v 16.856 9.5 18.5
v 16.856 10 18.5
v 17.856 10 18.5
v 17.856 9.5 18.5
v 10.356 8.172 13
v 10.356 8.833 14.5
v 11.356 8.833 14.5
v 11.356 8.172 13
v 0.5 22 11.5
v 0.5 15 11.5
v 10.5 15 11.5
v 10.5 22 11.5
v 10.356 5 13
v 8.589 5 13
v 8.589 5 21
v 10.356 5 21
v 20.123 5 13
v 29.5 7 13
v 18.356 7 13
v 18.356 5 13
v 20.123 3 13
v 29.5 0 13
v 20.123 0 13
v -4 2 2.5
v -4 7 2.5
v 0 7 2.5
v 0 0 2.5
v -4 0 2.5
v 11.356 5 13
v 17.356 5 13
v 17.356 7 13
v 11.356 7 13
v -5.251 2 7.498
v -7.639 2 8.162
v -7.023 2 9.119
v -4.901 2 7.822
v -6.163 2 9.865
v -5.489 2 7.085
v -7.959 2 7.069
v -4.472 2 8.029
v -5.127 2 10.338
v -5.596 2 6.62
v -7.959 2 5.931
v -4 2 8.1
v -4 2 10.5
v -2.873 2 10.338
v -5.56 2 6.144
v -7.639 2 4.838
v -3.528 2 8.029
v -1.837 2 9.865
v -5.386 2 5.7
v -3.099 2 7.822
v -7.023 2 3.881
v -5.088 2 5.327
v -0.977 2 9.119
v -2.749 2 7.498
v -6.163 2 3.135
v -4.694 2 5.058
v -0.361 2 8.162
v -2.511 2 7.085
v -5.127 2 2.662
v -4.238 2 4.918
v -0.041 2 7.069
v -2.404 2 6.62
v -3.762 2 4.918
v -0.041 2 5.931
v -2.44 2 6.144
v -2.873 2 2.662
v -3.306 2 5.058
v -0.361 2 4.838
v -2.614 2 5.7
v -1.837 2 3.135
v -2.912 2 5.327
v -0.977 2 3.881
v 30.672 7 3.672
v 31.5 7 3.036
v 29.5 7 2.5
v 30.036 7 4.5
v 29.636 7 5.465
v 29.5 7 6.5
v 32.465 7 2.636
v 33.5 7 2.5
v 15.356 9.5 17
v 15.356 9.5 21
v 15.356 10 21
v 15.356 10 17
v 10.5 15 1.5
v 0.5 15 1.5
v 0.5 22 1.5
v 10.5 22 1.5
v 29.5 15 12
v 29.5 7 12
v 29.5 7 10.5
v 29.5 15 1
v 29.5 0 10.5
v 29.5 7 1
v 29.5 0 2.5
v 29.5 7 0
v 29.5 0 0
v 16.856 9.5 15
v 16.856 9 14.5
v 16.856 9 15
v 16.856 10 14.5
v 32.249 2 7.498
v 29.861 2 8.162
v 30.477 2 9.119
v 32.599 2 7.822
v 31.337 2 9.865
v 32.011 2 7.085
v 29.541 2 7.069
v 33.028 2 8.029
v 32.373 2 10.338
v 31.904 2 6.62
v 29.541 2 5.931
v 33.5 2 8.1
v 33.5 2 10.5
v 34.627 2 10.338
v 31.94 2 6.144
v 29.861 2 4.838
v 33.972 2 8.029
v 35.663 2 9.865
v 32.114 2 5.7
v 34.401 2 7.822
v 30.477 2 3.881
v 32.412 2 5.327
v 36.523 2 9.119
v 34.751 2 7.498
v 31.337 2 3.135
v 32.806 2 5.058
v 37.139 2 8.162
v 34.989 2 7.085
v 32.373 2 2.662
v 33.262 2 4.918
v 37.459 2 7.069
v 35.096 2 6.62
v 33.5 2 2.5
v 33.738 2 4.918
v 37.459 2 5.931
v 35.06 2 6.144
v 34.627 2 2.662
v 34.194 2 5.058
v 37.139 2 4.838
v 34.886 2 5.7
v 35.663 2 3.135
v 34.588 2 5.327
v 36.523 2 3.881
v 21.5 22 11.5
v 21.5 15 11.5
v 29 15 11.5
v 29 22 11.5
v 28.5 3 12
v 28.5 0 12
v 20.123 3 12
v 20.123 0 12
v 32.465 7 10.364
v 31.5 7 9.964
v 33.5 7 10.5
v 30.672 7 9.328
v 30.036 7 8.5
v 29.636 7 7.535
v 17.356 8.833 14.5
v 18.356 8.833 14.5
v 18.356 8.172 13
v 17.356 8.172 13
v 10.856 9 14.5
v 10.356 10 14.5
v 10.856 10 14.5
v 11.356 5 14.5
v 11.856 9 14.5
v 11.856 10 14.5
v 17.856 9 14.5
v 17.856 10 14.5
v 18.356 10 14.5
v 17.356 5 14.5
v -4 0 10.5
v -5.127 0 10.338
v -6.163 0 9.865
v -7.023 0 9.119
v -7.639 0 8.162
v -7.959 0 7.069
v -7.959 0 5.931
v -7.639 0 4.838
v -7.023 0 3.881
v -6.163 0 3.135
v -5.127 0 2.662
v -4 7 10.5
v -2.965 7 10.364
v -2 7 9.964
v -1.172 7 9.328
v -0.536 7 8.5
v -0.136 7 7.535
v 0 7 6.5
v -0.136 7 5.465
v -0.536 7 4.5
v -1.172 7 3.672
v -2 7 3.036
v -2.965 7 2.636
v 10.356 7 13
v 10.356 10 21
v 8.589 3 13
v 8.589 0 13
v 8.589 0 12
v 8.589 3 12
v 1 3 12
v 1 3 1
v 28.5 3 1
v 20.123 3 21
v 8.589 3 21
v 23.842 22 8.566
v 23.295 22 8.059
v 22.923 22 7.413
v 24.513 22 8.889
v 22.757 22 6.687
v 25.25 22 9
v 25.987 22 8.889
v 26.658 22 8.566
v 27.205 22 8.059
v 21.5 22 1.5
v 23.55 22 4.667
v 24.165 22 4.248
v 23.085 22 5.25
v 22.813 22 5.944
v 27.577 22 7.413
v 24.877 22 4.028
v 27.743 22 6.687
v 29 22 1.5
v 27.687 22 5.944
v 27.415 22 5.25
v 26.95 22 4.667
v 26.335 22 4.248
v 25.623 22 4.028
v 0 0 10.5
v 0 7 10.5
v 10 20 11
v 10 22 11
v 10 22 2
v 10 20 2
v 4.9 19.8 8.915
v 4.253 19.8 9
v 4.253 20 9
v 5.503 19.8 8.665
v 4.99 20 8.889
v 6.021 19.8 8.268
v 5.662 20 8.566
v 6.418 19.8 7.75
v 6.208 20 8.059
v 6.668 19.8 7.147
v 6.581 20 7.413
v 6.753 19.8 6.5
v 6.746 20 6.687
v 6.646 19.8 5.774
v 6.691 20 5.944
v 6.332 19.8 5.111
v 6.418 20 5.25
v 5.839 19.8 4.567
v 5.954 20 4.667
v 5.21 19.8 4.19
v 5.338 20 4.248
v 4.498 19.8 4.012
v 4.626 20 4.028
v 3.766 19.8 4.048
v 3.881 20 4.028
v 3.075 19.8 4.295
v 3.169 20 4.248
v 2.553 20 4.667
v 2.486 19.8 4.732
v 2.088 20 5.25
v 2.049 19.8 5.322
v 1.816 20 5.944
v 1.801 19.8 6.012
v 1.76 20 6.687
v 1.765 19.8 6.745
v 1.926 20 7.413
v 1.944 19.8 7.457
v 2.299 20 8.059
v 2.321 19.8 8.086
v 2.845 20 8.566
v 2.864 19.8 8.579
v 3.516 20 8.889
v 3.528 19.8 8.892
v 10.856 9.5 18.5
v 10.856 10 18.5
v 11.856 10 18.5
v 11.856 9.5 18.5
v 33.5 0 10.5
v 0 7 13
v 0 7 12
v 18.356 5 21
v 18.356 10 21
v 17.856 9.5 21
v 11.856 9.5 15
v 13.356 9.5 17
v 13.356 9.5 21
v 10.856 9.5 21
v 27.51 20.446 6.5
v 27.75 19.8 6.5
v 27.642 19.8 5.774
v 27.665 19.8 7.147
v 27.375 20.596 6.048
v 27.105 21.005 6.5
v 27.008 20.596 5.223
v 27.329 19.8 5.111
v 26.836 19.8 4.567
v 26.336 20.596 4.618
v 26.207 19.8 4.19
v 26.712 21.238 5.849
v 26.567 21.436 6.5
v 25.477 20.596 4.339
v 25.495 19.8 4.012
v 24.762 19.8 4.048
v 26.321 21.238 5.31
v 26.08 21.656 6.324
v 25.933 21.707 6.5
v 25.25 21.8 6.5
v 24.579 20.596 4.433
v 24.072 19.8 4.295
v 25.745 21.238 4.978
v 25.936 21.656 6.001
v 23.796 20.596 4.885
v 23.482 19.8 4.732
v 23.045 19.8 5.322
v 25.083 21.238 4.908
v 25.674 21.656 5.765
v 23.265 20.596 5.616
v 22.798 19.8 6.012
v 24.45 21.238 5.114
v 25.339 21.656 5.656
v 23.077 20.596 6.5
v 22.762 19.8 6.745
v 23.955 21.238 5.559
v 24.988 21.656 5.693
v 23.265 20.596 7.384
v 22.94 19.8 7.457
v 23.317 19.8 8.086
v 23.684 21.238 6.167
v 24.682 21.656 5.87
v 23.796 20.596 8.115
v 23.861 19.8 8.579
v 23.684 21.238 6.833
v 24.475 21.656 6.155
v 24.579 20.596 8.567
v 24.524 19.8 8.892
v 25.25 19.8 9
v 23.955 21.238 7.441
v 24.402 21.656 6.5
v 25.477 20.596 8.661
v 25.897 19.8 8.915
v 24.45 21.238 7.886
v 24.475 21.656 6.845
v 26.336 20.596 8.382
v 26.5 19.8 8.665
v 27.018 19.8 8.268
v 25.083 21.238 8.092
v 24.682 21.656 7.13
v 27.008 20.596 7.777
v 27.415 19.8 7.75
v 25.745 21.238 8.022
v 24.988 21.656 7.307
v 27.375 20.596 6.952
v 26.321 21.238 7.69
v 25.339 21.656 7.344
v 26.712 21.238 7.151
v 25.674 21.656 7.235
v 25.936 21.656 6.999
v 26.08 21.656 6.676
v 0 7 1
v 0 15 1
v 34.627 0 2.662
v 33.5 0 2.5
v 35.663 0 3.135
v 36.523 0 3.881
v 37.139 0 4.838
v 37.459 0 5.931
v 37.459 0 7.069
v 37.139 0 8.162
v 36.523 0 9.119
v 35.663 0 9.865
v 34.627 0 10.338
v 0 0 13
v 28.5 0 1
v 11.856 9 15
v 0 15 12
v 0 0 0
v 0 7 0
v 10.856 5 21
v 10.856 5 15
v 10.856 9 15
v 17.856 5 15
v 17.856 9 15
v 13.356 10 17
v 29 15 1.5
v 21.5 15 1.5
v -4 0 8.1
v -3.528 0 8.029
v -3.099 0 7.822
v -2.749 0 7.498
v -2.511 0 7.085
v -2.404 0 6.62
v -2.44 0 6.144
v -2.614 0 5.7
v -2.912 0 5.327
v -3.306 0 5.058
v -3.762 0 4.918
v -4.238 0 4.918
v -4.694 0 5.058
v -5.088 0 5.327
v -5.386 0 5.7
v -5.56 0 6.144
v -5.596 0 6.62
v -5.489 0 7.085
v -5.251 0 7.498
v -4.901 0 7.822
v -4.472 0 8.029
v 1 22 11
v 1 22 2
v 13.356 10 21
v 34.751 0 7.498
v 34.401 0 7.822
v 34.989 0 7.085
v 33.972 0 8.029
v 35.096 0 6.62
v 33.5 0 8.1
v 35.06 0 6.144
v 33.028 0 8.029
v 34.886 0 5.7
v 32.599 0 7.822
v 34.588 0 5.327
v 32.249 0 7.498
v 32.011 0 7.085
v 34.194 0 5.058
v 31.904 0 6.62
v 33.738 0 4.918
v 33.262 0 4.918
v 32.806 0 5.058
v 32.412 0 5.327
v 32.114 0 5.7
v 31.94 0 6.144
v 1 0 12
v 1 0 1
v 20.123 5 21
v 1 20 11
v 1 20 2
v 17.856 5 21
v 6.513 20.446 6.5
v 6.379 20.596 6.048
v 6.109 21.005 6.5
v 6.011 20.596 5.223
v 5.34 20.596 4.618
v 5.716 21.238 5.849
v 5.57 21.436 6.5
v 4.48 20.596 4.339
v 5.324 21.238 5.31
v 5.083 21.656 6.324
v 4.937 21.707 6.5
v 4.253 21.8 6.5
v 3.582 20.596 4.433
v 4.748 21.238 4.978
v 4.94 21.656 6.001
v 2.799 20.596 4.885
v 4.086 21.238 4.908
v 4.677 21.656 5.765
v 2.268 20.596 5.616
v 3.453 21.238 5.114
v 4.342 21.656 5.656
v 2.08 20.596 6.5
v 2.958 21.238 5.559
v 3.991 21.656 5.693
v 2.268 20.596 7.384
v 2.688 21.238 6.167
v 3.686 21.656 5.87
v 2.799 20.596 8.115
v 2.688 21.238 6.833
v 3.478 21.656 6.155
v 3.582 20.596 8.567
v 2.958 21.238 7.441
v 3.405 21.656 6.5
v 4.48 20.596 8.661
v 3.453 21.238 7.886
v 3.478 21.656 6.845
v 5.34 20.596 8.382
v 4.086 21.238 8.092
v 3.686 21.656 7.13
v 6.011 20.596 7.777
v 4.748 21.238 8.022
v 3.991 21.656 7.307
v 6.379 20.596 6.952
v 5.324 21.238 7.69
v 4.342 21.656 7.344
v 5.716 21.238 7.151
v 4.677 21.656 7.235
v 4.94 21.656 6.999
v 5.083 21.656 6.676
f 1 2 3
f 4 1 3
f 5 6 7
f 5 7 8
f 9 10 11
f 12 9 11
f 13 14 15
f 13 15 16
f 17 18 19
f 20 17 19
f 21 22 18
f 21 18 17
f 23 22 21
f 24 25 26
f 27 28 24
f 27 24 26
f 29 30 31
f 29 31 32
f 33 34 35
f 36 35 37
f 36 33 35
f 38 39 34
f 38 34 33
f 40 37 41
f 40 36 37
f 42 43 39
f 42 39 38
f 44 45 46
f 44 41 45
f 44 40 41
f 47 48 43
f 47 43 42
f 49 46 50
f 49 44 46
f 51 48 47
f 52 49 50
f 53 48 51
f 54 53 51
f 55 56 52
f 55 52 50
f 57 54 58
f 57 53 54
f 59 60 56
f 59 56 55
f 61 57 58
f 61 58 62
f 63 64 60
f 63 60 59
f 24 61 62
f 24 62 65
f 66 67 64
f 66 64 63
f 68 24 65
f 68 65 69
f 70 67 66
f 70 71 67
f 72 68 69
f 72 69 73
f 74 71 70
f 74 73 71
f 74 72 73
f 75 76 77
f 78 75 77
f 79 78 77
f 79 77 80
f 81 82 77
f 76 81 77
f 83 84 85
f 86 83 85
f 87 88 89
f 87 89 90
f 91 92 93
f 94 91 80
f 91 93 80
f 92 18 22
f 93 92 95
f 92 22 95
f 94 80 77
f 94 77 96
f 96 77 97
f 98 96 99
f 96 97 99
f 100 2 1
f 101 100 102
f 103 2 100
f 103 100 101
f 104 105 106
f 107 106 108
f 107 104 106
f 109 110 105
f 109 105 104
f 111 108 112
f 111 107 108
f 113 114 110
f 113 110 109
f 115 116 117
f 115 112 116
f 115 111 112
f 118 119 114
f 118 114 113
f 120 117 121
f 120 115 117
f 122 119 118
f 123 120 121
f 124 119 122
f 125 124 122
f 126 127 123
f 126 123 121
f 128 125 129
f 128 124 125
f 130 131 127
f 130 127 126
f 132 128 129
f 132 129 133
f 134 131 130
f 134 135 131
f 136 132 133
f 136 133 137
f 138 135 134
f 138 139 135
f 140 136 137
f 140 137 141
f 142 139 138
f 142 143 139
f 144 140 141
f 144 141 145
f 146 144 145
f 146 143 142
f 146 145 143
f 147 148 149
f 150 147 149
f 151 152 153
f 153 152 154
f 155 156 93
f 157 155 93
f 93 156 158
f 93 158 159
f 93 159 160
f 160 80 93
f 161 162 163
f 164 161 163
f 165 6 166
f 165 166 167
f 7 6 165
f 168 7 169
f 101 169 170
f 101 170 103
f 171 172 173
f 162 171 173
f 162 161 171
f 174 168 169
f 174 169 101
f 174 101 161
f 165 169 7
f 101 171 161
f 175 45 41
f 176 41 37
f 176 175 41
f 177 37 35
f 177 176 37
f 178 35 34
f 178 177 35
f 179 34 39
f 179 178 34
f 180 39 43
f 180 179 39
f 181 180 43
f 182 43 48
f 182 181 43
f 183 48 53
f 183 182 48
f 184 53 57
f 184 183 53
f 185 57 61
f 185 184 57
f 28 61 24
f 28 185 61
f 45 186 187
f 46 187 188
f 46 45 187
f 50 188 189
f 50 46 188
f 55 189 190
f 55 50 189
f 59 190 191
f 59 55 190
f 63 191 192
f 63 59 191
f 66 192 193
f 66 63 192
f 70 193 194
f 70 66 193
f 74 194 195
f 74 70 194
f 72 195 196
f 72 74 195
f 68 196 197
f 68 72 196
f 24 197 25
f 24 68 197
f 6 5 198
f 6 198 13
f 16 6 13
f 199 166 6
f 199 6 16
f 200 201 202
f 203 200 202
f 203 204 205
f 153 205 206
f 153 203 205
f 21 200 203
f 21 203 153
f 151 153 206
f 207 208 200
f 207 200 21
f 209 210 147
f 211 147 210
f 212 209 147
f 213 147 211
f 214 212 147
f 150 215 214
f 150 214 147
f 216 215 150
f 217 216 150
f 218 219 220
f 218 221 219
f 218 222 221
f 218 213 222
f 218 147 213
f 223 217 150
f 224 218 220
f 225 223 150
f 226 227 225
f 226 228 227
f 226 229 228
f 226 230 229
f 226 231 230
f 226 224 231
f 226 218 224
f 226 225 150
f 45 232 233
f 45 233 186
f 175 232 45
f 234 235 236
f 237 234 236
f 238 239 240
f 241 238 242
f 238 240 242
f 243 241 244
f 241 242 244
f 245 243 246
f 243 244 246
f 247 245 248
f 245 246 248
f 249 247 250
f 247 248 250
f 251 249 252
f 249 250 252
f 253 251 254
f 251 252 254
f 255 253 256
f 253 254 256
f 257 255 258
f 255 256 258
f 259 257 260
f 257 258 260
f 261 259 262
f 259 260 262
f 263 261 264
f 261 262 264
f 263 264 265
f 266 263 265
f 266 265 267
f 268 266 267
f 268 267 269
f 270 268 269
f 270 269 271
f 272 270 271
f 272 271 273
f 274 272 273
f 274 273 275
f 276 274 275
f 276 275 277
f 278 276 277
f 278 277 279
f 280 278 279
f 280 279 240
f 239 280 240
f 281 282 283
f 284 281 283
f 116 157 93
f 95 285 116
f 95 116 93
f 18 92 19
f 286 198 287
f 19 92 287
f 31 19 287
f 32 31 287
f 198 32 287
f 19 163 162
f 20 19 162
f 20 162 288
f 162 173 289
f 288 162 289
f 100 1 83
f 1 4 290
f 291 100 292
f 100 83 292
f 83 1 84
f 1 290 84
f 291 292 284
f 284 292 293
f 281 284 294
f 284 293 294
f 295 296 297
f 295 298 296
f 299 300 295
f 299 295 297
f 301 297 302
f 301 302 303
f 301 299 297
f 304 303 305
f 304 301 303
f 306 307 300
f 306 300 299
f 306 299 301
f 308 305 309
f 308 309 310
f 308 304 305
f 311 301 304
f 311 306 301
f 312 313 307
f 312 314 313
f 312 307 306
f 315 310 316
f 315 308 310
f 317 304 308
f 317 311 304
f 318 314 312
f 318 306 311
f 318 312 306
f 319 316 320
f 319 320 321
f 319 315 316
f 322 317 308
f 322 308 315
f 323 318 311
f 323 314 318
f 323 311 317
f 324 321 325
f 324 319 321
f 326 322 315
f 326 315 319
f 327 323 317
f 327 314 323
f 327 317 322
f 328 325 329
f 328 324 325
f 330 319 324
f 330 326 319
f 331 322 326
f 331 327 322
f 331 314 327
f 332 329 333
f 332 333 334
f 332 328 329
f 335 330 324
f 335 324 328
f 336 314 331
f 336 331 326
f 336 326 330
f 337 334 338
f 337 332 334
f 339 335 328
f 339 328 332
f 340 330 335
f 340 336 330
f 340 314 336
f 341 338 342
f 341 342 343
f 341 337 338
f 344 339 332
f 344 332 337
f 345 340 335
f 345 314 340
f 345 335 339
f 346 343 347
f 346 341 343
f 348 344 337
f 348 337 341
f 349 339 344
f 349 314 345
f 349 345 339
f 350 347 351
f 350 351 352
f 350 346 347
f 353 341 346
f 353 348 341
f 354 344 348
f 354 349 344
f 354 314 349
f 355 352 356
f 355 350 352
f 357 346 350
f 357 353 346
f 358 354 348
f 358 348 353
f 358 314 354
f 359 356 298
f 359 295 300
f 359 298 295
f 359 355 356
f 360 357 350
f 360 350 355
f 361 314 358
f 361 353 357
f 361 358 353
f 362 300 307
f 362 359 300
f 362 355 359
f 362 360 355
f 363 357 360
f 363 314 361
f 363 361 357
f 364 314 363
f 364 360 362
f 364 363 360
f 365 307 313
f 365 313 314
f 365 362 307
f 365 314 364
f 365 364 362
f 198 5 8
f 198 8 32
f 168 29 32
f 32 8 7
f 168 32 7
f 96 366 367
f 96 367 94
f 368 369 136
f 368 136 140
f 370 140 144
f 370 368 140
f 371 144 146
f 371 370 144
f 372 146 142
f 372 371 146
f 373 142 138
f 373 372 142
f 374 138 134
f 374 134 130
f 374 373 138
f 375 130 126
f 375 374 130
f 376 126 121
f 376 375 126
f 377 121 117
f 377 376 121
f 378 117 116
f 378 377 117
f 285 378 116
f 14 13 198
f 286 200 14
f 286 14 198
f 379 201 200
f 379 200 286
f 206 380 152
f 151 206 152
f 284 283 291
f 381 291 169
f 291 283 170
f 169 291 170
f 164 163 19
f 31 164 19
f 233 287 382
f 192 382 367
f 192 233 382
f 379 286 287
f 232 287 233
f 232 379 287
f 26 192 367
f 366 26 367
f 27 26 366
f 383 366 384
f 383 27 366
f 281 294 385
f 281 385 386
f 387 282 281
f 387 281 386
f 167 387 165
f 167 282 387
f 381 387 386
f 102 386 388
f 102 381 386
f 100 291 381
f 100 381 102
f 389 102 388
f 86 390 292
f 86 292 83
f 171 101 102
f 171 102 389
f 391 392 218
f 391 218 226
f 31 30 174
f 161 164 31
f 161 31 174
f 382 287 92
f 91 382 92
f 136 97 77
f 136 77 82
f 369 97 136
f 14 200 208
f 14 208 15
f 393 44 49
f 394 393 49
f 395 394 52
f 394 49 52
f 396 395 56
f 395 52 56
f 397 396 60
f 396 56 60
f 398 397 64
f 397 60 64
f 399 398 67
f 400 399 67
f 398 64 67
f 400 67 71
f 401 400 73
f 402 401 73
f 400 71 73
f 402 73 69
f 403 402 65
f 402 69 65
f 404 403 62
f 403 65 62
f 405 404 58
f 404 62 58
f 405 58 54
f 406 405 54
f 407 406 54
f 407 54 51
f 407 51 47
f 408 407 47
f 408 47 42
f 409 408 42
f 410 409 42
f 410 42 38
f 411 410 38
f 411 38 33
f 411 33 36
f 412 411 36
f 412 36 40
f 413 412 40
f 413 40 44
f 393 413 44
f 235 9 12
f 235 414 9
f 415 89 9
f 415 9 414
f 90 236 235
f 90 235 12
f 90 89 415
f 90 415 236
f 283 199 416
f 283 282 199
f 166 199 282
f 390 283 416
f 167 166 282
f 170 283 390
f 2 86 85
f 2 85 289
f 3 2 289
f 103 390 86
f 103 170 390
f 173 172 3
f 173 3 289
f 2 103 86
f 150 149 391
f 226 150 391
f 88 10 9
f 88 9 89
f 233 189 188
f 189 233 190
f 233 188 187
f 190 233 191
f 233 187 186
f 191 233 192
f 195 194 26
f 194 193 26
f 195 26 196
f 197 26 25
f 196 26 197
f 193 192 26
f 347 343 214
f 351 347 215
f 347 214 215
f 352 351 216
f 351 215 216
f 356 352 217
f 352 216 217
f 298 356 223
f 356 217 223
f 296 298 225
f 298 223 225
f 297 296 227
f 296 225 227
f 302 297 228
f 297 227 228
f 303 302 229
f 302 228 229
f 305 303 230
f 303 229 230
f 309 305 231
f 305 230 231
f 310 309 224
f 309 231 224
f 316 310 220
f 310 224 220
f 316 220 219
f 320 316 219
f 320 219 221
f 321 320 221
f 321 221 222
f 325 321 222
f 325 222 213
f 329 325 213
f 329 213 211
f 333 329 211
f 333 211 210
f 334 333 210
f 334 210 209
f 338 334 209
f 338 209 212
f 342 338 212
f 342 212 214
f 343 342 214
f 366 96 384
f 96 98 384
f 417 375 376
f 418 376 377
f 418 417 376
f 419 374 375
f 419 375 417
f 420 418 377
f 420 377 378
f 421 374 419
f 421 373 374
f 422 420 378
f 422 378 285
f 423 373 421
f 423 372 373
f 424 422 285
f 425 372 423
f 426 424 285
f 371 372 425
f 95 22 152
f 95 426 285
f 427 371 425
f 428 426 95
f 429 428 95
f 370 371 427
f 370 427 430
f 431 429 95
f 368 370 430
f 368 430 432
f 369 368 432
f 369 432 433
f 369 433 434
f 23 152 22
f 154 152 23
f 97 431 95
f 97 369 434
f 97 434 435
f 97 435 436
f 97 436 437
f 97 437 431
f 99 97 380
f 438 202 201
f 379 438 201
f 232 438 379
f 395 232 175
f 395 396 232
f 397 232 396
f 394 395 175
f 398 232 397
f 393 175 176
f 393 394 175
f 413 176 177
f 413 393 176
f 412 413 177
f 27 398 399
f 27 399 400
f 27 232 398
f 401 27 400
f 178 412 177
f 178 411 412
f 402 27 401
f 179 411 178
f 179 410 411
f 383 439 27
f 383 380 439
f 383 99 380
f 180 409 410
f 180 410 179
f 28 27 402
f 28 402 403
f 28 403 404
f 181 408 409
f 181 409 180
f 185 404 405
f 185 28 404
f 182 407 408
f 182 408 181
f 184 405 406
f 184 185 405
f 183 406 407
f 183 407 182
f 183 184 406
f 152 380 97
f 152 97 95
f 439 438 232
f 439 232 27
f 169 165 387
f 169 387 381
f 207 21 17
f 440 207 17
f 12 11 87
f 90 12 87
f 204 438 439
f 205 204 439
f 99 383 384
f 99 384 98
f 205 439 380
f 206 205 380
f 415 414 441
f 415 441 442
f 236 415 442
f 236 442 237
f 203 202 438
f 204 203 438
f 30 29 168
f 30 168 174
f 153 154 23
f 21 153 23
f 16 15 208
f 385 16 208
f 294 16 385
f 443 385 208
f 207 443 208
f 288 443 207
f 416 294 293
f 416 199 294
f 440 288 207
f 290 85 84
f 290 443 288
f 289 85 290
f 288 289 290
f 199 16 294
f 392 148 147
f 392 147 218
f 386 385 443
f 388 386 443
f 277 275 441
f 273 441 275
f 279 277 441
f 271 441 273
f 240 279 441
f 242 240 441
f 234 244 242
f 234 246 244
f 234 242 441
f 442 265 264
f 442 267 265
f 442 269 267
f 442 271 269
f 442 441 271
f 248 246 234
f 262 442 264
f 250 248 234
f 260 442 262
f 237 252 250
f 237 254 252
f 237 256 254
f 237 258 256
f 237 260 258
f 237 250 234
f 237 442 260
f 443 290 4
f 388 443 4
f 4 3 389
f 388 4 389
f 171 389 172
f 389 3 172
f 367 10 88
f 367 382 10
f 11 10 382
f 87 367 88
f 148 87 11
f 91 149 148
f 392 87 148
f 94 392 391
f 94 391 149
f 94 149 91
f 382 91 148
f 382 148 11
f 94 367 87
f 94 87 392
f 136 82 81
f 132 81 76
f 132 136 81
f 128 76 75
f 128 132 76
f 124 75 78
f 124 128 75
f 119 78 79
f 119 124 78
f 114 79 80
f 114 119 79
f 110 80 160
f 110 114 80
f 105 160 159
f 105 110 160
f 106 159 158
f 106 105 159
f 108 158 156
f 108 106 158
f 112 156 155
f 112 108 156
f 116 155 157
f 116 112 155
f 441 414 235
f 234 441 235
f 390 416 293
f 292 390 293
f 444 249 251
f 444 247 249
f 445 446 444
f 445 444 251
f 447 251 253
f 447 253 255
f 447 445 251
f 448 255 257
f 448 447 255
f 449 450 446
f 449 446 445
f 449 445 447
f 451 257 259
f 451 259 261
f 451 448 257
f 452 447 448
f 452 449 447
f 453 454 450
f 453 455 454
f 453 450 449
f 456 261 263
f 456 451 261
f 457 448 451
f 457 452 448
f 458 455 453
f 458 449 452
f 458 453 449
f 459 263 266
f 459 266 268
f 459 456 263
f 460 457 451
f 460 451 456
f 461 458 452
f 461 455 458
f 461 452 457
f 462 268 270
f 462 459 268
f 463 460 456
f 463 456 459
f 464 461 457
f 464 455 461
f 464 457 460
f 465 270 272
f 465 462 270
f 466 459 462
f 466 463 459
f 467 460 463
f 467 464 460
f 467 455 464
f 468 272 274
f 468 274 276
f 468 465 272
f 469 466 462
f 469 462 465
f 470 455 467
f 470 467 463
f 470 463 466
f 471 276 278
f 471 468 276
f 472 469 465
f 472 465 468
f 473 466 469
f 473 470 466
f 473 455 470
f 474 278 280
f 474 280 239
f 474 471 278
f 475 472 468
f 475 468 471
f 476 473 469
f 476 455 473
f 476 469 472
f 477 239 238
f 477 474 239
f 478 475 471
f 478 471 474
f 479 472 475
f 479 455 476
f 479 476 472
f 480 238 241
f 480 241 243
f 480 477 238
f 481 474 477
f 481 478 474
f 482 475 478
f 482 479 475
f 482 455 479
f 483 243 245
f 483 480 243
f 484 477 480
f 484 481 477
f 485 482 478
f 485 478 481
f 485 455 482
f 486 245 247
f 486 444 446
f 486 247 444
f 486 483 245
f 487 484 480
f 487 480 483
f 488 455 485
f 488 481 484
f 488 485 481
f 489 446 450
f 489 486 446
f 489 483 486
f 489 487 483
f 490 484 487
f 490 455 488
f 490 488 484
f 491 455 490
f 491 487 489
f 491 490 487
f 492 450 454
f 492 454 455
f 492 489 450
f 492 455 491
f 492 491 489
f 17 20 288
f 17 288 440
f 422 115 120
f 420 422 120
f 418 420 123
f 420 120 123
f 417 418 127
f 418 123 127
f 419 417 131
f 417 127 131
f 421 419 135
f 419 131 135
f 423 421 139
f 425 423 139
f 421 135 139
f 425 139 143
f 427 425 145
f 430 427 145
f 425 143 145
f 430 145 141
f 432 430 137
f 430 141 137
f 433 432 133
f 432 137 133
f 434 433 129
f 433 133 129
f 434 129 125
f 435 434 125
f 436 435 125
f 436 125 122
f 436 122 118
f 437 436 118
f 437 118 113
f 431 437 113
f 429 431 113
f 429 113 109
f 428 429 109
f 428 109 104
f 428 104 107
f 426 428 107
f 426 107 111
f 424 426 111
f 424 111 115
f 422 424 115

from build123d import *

# Parameters (mm, degrees)
EXTRUDE_1_DEPTH     = 7
CUT_EXTRUDE_START   = -5
SKETCH_2_R          = 4
CUT_EXTRUDE_1_DEPTH = 5
SKETCH_3_W          = 29.5
SKETCH_3_H          = 11
EXTRUDE_2_DEPTH     = 8
SKETCH_4_W          = 7.5
SKETCH_4_H          = 10
SKETCH_4_W_2        = 10
EXTRUDE_3_DEPTH     = 7
SKETCH_5_W          = 9
SKETCH_5_H          = 9
CUT_EXTRUDE_2_DEPTH = 2
SKETCH_6_R          = 2.5
CUT_EXTRUDE_3_DEPTH = 2.2
SKETCH_7_R          = 1.6
CUT_EXTRUDE_4_DEPTH = 45.443784717
SKETCH_8_W          = 11.533749137
SKETCH_8_H          = 5
EXTRUDE_4_DEPTH     = 8
CUT_EXTRUDE_5_DEPTH = 3
SKETCH_11_W         = 8
SKETCH_11_H         = 6.5
EXTRUDE_6_DEPTH     = 5
EXTRUDE_7_DEPTH     = 1
EXTRUDE_8_DEPTH     = 1
CUT_EXTRUDE_6_DEPTH = 4
SKETCH_15_W         = 7
SKETCH_15_H         = 4.5
CUT_EXTRUDE_7_DEPTH = 2
SKETCH_16_W         = 1
SKETCH_16_H         = 4
CUT_EXTRUDE_8_DEPTH = 1


# Read off the part's stored shape, not the designer's step: 圆顶1, 圆顶2
with BuildPart() as part:
    # 草图1 → 凸台-拉伸1 (new body)
    with BuildSketch(Plane(origin=(0, 0, 0), x_dir=(1, 0, 0), z_dir=(0, 1, 0))):
        with BuildLine():
            Line((0, 0), (29.5, 0))
            Line((29.5, 0), (29.5, -2.5))
            Line((29.5, -2.5), (33.5, -2.5))
            ThreePointArc((33.5, -2.5), (37.5, -6.5), (33.5, -10.5))
            Line((33.5, -10.5), (29.5, -10.5))
            Line((29.5, -10.5), (29.5, -13))
            Line((29.5, -13), (0, -13))
            Line((0, -13), (0, -10.5))
            Line((0, -10.5), (-4, -10.5))
            ThreePointArc((-4, -10.5), (-8, -6.5), (-4, -2.5))
            Line((-4, -2.5), (0, -2.5))
            Line((0, -2.5), (0, 0))
        make_face()
    extrude(amount=EXTRUDE_1_DEPTH)

    # 草图2 → 切除-拉伸1 (cut)
    with BuildSketch(Plane(origin=(0, 7, 0), x_dir=(1, 0, 0), z_dir=(0, 1, 0)).offset(CUT_EXTRUDE_START)):
        with Locations((-4, -6.5)):
            Circle(SKETCH_2_R)
        with Locations((33.5, -6.5)):
            Circle(SKETCH_2_R)
    extrude(amount=CUT_EXTRUDE_1_DEPTH, mode=Mode.SUBTRACT)

    # 草图3 → 凸台-拉伸2 (add)
    with BuildSketch(Plane(origin=(0, 7, 0), x_dir=(1, 0, 0), z_dir=(0, 1, 0))):
        with Locations((14.75, -6.5)):
            Rectangle(SKETCH_3_W, SKETCH_3_H)
    extrude(amount=EXTRUDE_2_DEPTH)

    # 草图4 → 凸台-拉伸3 (add)
    with BuildSketch(Plane(origin=(0, 15, 0), x_dir=(1, 0, 0), z_dir=(0, 1, 0))):
        with Locations((25.25, -6.5)):
            Rectangle(SKETCH_4_W, SKETCH_4_H)
        with Locations((5.5, -6.5)):
            Rectangle(SKETCH_4_W_2, SKETCH_4_H)
    extrude(amount=EXTRUDE_3_DEPTH)

    # 草图5 → 切除-拉伸2 (cut)
    with BuildSketch(Plane(origin=(0, 22, 0), x_dir=(1, 0, 0), z_dir=(0, 1, 0))):
        with Locations((5.5, -6.5)):
            Rectangle(SKETCH_5_W, SKETCH_5_H)
    extrude(amount=-CUT_EXTRUDE_2_DEPTH, mode=Mode.SUBTRACT)

    # 草图6 → 切除-拉伸3 (cut)
    with BuildSketch(Plane(origin=(0, 22, 0), x_dir=(1, 0, 0), z_dir=(0, 1, 0))):
        with Locations(Location((25.25, -6.5, 0), (0, 0, 270))):
            Circle(SKETCH_6_R)
        with Locations(Location((4.253331237, -6.5, 0), (0, 0, 270))):
            Circle(SKETCH_6_R)
    extrude(amount=-CUT_EXTRUDE_3_DEPTH, mode=Mode.SUBTRACT)

    # 圆顶1 outline → 圆顶1 (revolve)
    with BuildSketch(Plane(origin=(4.253331237, 0, 6.5), x_dir=(1, 0, 0), z_dir=(0, 0, 1))):
        with BuildLine():
            Line((0, 19.8), (2.500000001, 19.799999998))
            ThreePointArc((2.500000001, 19.799999998), (1.60078106, 21.238476323), (0, 21.8))
            Line((0, 21.8), (0, 19.8))
        make_face()
    revolve(axis=Axis((4.253331237, 0, 6.5), (0, 1, 0)))

    # 圆顶2 outline → 圆顶2 (revolve)
    with BuildSketch(Plane(origin=(25.25, 0, 6.5), x_dir=(1, 0, 0), z_dir=(0, 0, 1))):
        with BuildLine():
            Line((0, 19.8), (2.500000001, 19.799999997))
            ThreePointArc((2.500000001, 19.799999997), (1.60078106, 21.238476323), (0, 21.8))
            Line((0, 21.8), (0, 19.8))
        make_face()
    revolve(axis=Axis((25.25, 0, 6.5), (0, 1, 0)))

    # 草图7 → 切除-拉伸4 (cut, through all)
    with BuildSketch(Plane(origin=(0, 2, 0), x_dir=(1, 0, 0), z_dir=(0, 1, 0))):
        with Locations(Location((-4, -6.5, 0), (0, 0, 270))):
            Circle(SKETCH_7_R)
        with Locations(Location((33.5, -6.5, 0), (0, 0, 270))):
            Circle(SKETCH_7_R)
    extrude(amount=-CUT_EXTRUDE_4_DEPTH, mode=Mode.SUBTRACT)

    # 草图8 → 凸台-拉伸4 (add)
    with BuildSketch(Plane.XY.offset(13)):
        with Locations((14.355989937, 2.5)):
            Rectangle(SKETCH_8_W, SKETCH_8_H)
    extrude(amount=EXTRUDE_4_DEPTH)

    # 草图10 → 切除-拉伸5 (cut)
    with BuildSketch(Plane.XZ):
        Polygon((8.589115368, 21), (8.589115368, 12), (1, 12), (1, 1), (28.5, 1), (28.5, 12), (20.122864505, 12), (20.122864505, 21), align=None)
    extrude(amount=-CUT_EXTRUDE_5_DEPTH, mode=Mode.SUBTRACT)

    # 草图11 → 凸台-拉伸6 (add)
    with BuildSketch(Plane(origin=(0, 5, 0), x_dir=(1, 0, 0), z_dir=(0, 1, 0))):
        with Locations((14.355989936, -17.75)):
            Rectangle(SKETCH_11_W, SKETCH_11_H)
    extrude(amount=EXTRUDE_6_DEPTH)

    # 草图12 → 凸台-拉伸7 (add)
    with BuildSketch(Plane(origin=(18.355989936, 0, 0), x_dir=(0, 0, -1), z_dir=(1, 0, 0))):
        Polygon((-14.5, 8.832927064), (-13, 8.172497524), (-13, 5), (-14.5, 5), align=None)
    extrude(amount=-EXTRUDE_7_DEPTH)

    # 草图13 → 凸台-拉伸8 (add)
    with BuildSketch(Plane.ZY.offset(-10.355989936)):
        Polygon((14.5, 8.832927064), (13, 8.172497524), (13, 5), (14.5, 5), align=None)
    extrude(amount=-EXTRUDE_8_DEPTH)

    # 草图14 → 切除-拉伸6 (cut)
    with BuildSketch(Plane.XY.offset(21)):
        Polygon((10.855989936, 5), (17.855989936, 5), (17.855989936, 9.5), (15.355989936, 9.5), (15.355989936, 10), (13.355989936, 10), (13.355989936, 9.5), (10.855989936, 9.5), align=None)
    extrude(amount=-CUT_EXTRUDE_6_DEPTH, mode=Mode.SUBTRACT)

    # 草图15 → 切除-拉伸7 (cut)
    with BuildSketch(Plane.XY.offset(17)):
        with Locations((14.355989936, 7.25)):
            Rectangle(SKETCH_15_W, SKETCH_15_H)
    extrude(amount=-CUT_EXTRUDE_7_DEPTH, mode=Mode.SUBTRACT)

    # 草图16 → 切除-拉伸8 (cut)
    with BuildSketch(Plane(origin=(0, 10, 0), x_dir=(1, 0, 0), z_dir=(0, 1, 0))):
        with Locations((11.355989936, -16.5)):
            Rectangle(SKETCH_16_W, SKETCH_16_H)
        with Locations((17.355989936, -16.5)):
            Rectangle(SKETCH_16_W, SKETCH_16_H)
    extrude(amount=-CUT_EXTRUDE_8_DEPTH, mode=Mode.SUBTRACT)


solid = part.part
